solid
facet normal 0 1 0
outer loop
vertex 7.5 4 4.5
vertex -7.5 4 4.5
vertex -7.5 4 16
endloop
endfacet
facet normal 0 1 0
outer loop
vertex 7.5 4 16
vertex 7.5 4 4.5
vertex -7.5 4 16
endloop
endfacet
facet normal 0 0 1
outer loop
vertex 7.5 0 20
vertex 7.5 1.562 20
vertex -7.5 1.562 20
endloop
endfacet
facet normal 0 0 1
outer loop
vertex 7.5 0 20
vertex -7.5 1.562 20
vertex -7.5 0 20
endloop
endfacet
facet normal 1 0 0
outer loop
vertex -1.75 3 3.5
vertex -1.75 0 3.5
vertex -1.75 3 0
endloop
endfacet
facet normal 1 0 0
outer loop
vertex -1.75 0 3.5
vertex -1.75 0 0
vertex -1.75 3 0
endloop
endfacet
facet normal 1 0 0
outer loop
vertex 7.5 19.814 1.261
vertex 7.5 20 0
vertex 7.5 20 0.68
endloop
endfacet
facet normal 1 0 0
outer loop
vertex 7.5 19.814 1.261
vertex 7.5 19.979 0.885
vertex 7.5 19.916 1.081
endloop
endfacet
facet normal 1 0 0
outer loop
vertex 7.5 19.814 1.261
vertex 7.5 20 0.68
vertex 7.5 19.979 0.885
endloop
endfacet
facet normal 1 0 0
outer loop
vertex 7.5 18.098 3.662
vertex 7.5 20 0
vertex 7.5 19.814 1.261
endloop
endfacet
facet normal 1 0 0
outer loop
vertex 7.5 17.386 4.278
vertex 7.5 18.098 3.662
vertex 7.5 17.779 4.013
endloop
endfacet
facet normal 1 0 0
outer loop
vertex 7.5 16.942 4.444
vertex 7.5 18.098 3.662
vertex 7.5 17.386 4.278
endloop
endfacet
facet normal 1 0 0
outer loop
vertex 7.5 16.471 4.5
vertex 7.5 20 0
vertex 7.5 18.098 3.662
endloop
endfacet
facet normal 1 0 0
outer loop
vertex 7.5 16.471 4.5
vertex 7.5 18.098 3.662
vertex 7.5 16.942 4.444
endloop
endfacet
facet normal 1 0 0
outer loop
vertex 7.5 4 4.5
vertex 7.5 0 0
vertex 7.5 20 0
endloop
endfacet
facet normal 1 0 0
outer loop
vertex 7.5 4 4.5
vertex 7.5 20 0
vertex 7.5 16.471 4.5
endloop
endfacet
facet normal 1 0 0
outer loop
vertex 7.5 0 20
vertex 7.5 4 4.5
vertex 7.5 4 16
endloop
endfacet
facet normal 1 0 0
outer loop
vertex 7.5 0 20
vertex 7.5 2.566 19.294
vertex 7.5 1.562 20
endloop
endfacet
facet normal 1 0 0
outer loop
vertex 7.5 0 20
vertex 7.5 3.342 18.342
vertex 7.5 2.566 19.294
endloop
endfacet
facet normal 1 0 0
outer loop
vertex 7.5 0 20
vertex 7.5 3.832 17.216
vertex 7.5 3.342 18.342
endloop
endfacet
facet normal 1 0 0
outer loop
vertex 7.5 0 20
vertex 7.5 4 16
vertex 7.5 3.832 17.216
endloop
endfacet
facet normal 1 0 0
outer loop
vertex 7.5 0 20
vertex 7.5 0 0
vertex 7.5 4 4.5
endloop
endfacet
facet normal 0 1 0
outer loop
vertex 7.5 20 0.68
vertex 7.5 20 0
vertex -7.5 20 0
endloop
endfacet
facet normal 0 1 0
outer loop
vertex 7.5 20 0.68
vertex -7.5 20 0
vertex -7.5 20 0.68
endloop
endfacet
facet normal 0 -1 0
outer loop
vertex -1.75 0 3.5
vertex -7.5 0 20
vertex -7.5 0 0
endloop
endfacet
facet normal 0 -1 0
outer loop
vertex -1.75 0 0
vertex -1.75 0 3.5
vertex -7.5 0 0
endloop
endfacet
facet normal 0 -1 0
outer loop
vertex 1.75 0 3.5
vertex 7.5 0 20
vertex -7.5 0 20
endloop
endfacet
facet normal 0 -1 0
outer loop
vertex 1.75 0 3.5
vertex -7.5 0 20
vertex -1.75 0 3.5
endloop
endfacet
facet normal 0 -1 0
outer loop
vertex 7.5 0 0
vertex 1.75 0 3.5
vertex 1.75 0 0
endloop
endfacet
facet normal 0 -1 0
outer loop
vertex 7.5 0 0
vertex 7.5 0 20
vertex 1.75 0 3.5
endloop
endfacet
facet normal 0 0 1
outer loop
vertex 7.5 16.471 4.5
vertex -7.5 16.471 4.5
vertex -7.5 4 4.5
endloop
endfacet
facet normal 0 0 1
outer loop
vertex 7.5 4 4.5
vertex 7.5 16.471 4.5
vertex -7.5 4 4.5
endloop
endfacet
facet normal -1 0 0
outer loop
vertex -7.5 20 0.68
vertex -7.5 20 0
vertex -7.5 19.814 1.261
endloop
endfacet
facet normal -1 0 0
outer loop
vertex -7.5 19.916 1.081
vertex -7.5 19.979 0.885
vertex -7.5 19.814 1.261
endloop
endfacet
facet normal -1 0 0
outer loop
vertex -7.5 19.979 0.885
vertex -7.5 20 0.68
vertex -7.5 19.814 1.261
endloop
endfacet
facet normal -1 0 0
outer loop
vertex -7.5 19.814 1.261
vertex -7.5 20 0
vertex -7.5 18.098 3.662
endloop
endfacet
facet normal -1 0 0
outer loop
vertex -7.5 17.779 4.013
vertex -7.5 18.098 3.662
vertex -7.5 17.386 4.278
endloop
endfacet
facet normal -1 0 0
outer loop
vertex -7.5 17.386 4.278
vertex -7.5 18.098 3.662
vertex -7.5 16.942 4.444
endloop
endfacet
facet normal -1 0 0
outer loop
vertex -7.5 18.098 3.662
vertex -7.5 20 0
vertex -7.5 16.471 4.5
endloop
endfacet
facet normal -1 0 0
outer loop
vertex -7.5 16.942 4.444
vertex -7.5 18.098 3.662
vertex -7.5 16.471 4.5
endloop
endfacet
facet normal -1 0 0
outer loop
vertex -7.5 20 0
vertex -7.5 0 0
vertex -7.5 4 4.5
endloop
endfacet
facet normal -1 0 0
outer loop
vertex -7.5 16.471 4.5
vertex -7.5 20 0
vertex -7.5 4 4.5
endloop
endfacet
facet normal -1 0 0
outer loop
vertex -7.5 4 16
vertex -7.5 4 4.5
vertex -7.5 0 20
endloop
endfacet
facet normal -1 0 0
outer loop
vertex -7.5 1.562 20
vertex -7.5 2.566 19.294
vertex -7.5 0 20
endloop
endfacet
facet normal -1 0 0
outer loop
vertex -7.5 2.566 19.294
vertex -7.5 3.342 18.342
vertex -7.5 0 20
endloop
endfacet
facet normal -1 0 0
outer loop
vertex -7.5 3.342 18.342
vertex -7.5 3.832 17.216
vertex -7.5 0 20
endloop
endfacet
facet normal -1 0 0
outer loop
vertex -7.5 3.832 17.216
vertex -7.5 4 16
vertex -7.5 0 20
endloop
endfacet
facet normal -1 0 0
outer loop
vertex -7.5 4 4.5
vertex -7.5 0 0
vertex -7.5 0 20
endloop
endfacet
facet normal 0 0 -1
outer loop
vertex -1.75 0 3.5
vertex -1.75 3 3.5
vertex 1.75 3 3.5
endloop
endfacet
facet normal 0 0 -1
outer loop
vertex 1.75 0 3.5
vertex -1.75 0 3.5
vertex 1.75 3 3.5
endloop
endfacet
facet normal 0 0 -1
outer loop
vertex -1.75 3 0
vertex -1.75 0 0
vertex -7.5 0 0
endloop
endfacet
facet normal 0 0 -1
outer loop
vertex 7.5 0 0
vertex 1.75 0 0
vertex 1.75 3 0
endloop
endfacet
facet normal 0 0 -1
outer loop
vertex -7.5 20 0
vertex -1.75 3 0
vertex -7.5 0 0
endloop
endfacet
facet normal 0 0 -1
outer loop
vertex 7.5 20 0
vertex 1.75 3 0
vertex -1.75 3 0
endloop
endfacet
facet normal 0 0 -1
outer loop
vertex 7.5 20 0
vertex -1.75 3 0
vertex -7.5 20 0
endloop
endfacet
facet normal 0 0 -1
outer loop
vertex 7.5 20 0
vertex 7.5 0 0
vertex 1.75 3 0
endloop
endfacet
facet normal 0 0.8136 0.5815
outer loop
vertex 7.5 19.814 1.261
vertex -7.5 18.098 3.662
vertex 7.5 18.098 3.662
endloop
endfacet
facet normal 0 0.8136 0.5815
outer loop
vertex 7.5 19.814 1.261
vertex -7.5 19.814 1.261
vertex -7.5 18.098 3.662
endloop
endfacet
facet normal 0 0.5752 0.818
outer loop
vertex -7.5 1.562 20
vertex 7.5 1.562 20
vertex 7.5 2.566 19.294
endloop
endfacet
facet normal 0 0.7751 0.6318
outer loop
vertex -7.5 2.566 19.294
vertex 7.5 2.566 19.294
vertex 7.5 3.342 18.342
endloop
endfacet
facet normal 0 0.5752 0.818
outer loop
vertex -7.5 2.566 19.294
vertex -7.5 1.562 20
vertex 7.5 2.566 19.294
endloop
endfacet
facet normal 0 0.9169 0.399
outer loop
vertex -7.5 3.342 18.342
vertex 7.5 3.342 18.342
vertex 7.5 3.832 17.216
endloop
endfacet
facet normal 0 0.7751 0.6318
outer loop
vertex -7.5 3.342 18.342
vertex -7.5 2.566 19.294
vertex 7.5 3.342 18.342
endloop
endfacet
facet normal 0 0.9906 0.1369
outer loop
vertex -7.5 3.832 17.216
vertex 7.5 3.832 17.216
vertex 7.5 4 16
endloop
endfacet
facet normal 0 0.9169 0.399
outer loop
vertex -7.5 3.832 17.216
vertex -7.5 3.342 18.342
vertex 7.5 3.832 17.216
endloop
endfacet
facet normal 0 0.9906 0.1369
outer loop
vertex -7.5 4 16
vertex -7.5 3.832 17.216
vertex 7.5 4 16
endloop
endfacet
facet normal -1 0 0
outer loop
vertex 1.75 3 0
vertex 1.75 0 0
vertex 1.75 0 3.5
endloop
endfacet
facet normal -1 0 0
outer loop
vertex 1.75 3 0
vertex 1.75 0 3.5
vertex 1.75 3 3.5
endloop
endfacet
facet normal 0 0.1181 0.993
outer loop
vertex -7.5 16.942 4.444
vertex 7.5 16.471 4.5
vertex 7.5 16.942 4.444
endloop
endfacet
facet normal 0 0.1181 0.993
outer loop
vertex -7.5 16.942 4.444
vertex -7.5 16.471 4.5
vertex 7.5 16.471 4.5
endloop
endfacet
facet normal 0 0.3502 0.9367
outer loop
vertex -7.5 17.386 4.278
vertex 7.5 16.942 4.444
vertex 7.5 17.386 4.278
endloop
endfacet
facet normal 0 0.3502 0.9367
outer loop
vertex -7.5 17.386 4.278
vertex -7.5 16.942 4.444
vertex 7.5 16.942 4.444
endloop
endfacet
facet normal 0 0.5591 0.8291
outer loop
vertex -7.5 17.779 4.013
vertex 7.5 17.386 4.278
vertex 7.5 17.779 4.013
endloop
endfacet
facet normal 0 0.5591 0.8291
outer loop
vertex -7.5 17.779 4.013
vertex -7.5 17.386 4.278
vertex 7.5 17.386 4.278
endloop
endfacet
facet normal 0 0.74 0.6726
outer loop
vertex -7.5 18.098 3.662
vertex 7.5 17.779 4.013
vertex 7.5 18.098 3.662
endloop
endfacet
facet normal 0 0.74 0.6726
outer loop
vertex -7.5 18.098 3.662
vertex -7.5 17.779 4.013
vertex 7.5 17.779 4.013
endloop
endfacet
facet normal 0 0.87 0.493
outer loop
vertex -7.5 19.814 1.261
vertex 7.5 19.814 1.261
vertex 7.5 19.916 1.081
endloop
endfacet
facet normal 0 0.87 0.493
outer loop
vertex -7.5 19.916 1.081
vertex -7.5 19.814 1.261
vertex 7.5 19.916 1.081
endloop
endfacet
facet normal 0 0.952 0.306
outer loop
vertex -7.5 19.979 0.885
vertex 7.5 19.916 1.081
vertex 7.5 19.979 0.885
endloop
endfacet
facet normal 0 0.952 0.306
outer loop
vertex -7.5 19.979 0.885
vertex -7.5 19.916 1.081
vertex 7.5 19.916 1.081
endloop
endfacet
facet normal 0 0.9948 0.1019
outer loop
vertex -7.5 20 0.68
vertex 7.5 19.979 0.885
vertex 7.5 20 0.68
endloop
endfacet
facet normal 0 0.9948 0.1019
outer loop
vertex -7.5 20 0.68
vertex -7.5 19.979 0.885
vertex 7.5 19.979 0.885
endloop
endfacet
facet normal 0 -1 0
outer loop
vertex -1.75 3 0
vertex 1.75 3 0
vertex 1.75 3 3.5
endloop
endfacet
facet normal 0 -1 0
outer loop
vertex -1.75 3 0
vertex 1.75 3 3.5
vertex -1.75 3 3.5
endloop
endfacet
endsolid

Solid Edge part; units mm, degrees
sketch "Sketch1" plane through (0, 0, 0) normal (-1, 0, 0) x (0, -1, 0)
  line L0 (-4, 4.5) -> (-4, 20)
  line L1 (-4, 20) -> (0, 20)
  line L2 (0, 20) -> (0, 0)
  line L3 (0, 0) -> (-20, 0)
  line L4 (-20, 0) -> (-20, 4.5)
  line L5 (-20, 4.5) -> (-4, 4.5)
extrude "Protrusion1" add sketch "Sketch1" along normal mid plane 15
sketch "Sketch2" plane through (0, 10, 0) normal (0, 0, -1) x (0, -1, 0)
  line L0 (10, -1.75) -> (7, -1.75)
  line L1 (10, 1.75) -> (10, -1.75)
  line L2 (10, 1.75) -> (7, 1.75)
  line L3 (7, -1.75) -> (7, 1.75)
extrude "ExtrudedCutout_1" cut sketch "Sketch2" against normal blind 3.5
chamfer "Chamfer_1" distance 2.5 distance2 3.5 1 edges at (0, 20, 4.5) measured on face at (-4.85, 17.4933, 4.5)
sketch "Sketch3" plane through (-7.5, 11, 10) normal (-1, 0, 0) x (0, -1, 0)
  line L0 (7, 6) -> (7, 10)
  line L1 (7, 10) -> (9.4384, 10)
  arc A0 (9.4384, 10) -> (7, 6) centre (11.5, 6) ccw
extrude "Cutout1" cut sketch "Sketch3" against normal through all
fillet "Round_1" radius 2 1 edges at (0, 17.5, 4.5)
fillet "Round_2" radius 1 1 edges at (0, 20, 1)
properties material "POM"
